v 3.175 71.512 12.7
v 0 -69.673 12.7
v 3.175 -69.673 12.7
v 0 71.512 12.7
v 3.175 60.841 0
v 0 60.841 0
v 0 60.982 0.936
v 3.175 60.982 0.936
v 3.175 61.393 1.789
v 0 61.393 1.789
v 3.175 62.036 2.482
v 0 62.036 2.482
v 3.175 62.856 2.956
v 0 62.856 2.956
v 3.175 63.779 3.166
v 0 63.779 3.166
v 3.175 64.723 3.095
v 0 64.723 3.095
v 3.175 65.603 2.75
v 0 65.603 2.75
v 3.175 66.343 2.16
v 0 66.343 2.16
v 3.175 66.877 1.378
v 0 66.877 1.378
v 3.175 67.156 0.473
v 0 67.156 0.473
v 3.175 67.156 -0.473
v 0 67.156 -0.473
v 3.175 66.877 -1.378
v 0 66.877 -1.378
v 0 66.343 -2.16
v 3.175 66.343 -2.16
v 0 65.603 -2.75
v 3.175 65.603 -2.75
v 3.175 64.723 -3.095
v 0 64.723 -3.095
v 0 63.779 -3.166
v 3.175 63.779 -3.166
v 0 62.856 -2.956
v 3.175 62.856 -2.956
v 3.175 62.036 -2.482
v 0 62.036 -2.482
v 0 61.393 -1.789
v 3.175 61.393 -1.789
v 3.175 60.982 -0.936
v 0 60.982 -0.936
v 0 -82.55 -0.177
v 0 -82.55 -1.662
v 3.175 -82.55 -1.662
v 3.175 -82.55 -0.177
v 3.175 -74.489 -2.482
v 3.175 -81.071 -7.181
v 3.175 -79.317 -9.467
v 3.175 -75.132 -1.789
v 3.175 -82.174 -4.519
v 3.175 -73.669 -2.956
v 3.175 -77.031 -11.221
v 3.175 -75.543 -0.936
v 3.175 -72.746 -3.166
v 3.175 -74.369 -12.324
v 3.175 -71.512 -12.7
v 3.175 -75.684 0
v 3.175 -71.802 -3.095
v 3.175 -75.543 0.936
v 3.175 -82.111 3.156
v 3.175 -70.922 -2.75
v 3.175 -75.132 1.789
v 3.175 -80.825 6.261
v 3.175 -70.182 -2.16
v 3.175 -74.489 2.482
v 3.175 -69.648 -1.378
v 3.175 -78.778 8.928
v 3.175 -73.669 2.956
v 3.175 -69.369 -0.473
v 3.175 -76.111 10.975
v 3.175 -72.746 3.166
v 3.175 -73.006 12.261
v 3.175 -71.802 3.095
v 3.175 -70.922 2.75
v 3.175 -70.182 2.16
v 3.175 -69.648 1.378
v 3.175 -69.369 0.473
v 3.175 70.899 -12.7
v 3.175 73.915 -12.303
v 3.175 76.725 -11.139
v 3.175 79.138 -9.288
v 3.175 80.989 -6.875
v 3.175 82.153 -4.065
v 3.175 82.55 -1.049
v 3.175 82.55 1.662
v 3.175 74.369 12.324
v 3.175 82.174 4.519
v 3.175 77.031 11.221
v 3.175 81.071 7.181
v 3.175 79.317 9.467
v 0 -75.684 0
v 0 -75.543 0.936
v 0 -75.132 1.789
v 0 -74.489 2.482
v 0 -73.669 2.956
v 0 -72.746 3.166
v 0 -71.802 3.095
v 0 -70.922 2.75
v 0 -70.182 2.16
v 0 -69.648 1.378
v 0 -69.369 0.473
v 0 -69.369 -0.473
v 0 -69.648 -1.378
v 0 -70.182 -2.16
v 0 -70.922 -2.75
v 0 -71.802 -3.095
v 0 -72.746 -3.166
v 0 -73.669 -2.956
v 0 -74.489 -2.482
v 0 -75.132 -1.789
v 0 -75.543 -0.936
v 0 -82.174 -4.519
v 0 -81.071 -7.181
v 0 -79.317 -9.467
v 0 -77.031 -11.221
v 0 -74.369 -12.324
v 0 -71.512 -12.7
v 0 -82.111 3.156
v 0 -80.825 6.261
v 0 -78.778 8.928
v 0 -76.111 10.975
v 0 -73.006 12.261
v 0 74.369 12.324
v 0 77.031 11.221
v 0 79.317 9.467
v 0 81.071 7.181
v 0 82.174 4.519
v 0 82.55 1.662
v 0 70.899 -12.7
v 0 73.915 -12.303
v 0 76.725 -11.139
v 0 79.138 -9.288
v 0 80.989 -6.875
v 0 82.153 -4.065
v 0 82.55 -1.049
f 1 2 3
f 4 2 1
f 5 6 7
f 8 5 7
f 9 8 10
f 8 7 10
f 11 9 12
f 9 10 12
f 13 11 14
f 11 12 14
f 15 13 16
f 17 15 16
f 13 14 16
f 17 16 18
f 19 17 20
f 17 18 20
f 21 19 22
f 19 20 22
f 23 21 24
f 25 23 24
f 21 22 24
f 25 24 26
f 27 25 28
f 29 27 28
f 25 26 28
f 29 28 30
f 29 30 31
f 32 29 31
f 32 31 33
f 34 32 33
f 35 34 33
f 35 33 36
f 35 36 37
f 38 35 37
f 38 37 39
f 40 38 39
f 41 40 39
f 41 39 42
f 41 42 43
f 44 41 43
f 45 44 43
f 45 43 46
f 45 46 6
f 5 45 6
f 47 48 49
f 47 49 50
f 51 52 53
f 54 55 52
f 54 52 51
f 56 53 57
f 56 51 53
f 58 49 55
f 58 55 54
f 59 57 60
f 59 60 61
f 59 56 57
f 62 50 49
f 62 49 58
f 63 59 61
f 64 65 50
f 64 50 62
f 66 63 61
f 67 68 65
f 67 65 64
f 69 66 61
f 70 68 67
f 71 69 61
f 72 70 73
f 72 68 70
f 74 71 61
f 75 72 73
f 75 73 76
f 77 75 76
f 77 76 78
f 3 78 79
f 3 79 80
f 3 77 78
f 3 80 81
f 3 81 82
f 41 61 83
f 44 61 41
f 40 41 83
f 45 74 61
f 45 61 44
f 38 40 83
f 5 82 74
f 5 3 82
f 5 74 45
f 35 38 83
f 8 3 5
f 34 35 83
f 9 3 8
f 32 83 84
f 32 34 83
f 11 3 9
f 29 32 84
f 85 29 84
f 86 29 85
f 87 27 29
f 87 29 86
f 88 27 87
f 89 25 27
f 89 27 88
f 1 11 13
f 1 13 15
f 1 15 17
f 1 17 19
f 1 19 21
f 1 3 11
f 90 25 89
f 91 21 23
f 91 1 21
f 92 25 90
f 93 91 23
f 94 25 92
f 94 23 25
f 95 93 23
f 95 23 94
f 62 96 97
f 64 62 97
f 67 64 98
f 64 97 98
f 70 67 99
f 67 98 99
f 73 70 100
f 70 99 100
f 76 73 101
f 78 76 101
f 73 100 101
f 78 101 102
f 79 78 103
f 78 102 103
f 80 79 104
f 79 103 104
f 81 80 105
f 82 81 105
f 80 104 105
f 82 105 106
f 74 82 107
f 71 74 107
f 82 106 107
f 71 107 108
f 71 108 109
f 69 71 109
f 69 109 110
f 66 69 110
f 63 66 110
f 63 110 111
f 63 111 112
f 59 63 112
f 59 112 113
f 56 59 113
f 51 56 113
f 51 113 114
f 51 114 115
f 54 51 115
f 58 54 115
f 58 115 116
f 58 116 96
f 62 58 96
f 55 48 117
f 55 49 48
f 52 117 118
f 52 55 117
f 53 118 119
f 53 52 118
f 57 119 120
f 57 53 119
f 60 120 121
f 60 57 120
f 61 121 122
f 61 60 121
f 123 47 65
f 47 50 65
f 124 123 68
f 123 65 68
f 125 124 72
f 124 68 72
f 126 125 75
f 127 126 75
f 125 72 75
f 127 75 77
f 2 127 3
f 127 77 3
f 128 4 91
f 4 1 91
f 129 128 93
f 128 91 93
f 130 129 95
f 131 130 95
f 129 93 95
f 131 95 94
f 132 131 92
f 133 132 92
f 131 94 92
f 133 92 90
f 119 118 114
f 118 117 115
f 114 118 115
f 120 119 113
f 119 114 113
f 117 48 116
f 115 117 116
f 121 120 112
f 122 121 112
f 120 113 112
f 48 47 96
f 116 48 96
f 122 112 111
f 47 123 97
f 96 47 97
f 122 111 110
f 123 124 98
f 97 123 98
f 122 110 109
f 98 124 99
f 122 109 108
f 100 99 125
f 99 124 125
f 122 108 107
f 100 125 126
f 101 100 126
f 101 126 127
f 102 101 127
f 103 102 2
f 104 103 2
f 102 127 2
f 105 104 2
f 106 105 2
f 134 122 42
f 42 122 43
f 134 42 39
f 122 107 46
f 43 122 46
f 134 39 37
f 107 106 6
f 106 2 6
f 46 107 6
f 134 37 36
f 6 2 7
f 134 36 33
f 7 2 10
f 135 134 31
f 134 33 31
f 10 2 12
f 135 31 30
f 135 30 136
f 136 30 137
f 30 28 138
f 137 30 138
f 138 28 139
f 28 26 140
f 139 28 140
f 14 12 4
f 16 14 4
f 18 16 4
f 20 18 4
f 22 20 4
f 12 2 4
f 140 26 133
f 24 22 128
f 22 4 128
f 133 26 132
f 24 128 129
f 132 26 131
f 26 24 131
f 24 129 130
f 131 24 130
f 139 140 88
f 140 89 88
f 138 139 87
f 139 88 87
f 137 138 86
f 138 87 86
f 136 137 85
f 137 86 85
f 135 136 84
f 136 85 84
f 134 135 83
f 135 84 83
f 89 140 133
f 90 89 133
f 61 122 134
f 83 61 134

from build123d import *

# Parameters (mm, degrees)
F0_W     = 165.1
F0_H     = 25.4
F1_DEPTH = 3.175
F2_R     = 12.877415
F3_R     = 11.037784
F4_R     = 11.037784
F5_R     = 11.650995
F7_D     = 6.35


with BuildPart() as f1:
    # F0 (on Right) → F1 (new body)
    with BuildSketch(Plane.YZ):
        Rectangle(F0_W, F0_H)
    extrude(amount=F1_DEPTH)

    # F2
    f2_edges = [f1.edges().sort_by_distance(p)[0] for p in [
        (1.5875, -82.55, 12.7),
    ]]
    fillet(f2_edges, radius=F2_R)

    # F3
    f3_edges = [f1.edges().sort_by_distance(p)[0] for p in [
        (1.5875, -82.55, -12.7),
    ]]
    fillet(f3_edges, radius=F3_R)

    # F4
    f4_edges = [f1.edges().sort_by_distance(p)[0] for p in [
        (1.5875, 82.55, 12.7),
    ]]
    fillet(f4_edges, radius=F4_R)

    # F5
    f5_edges = [f1.edges().sort_by_distance(p)[0] for p in [
        (1.5875, 82.55, -12.7),
    ]]
    fillet(f5_edges, radius=F5_R)

    # F7 (through all)
    with Locations(Plane.YZ.offset(3.175)):
        with Locations((-72.509001, 0), (64.015999, 0)):
            Hole(F7_D / 2)


solid = f1.part
